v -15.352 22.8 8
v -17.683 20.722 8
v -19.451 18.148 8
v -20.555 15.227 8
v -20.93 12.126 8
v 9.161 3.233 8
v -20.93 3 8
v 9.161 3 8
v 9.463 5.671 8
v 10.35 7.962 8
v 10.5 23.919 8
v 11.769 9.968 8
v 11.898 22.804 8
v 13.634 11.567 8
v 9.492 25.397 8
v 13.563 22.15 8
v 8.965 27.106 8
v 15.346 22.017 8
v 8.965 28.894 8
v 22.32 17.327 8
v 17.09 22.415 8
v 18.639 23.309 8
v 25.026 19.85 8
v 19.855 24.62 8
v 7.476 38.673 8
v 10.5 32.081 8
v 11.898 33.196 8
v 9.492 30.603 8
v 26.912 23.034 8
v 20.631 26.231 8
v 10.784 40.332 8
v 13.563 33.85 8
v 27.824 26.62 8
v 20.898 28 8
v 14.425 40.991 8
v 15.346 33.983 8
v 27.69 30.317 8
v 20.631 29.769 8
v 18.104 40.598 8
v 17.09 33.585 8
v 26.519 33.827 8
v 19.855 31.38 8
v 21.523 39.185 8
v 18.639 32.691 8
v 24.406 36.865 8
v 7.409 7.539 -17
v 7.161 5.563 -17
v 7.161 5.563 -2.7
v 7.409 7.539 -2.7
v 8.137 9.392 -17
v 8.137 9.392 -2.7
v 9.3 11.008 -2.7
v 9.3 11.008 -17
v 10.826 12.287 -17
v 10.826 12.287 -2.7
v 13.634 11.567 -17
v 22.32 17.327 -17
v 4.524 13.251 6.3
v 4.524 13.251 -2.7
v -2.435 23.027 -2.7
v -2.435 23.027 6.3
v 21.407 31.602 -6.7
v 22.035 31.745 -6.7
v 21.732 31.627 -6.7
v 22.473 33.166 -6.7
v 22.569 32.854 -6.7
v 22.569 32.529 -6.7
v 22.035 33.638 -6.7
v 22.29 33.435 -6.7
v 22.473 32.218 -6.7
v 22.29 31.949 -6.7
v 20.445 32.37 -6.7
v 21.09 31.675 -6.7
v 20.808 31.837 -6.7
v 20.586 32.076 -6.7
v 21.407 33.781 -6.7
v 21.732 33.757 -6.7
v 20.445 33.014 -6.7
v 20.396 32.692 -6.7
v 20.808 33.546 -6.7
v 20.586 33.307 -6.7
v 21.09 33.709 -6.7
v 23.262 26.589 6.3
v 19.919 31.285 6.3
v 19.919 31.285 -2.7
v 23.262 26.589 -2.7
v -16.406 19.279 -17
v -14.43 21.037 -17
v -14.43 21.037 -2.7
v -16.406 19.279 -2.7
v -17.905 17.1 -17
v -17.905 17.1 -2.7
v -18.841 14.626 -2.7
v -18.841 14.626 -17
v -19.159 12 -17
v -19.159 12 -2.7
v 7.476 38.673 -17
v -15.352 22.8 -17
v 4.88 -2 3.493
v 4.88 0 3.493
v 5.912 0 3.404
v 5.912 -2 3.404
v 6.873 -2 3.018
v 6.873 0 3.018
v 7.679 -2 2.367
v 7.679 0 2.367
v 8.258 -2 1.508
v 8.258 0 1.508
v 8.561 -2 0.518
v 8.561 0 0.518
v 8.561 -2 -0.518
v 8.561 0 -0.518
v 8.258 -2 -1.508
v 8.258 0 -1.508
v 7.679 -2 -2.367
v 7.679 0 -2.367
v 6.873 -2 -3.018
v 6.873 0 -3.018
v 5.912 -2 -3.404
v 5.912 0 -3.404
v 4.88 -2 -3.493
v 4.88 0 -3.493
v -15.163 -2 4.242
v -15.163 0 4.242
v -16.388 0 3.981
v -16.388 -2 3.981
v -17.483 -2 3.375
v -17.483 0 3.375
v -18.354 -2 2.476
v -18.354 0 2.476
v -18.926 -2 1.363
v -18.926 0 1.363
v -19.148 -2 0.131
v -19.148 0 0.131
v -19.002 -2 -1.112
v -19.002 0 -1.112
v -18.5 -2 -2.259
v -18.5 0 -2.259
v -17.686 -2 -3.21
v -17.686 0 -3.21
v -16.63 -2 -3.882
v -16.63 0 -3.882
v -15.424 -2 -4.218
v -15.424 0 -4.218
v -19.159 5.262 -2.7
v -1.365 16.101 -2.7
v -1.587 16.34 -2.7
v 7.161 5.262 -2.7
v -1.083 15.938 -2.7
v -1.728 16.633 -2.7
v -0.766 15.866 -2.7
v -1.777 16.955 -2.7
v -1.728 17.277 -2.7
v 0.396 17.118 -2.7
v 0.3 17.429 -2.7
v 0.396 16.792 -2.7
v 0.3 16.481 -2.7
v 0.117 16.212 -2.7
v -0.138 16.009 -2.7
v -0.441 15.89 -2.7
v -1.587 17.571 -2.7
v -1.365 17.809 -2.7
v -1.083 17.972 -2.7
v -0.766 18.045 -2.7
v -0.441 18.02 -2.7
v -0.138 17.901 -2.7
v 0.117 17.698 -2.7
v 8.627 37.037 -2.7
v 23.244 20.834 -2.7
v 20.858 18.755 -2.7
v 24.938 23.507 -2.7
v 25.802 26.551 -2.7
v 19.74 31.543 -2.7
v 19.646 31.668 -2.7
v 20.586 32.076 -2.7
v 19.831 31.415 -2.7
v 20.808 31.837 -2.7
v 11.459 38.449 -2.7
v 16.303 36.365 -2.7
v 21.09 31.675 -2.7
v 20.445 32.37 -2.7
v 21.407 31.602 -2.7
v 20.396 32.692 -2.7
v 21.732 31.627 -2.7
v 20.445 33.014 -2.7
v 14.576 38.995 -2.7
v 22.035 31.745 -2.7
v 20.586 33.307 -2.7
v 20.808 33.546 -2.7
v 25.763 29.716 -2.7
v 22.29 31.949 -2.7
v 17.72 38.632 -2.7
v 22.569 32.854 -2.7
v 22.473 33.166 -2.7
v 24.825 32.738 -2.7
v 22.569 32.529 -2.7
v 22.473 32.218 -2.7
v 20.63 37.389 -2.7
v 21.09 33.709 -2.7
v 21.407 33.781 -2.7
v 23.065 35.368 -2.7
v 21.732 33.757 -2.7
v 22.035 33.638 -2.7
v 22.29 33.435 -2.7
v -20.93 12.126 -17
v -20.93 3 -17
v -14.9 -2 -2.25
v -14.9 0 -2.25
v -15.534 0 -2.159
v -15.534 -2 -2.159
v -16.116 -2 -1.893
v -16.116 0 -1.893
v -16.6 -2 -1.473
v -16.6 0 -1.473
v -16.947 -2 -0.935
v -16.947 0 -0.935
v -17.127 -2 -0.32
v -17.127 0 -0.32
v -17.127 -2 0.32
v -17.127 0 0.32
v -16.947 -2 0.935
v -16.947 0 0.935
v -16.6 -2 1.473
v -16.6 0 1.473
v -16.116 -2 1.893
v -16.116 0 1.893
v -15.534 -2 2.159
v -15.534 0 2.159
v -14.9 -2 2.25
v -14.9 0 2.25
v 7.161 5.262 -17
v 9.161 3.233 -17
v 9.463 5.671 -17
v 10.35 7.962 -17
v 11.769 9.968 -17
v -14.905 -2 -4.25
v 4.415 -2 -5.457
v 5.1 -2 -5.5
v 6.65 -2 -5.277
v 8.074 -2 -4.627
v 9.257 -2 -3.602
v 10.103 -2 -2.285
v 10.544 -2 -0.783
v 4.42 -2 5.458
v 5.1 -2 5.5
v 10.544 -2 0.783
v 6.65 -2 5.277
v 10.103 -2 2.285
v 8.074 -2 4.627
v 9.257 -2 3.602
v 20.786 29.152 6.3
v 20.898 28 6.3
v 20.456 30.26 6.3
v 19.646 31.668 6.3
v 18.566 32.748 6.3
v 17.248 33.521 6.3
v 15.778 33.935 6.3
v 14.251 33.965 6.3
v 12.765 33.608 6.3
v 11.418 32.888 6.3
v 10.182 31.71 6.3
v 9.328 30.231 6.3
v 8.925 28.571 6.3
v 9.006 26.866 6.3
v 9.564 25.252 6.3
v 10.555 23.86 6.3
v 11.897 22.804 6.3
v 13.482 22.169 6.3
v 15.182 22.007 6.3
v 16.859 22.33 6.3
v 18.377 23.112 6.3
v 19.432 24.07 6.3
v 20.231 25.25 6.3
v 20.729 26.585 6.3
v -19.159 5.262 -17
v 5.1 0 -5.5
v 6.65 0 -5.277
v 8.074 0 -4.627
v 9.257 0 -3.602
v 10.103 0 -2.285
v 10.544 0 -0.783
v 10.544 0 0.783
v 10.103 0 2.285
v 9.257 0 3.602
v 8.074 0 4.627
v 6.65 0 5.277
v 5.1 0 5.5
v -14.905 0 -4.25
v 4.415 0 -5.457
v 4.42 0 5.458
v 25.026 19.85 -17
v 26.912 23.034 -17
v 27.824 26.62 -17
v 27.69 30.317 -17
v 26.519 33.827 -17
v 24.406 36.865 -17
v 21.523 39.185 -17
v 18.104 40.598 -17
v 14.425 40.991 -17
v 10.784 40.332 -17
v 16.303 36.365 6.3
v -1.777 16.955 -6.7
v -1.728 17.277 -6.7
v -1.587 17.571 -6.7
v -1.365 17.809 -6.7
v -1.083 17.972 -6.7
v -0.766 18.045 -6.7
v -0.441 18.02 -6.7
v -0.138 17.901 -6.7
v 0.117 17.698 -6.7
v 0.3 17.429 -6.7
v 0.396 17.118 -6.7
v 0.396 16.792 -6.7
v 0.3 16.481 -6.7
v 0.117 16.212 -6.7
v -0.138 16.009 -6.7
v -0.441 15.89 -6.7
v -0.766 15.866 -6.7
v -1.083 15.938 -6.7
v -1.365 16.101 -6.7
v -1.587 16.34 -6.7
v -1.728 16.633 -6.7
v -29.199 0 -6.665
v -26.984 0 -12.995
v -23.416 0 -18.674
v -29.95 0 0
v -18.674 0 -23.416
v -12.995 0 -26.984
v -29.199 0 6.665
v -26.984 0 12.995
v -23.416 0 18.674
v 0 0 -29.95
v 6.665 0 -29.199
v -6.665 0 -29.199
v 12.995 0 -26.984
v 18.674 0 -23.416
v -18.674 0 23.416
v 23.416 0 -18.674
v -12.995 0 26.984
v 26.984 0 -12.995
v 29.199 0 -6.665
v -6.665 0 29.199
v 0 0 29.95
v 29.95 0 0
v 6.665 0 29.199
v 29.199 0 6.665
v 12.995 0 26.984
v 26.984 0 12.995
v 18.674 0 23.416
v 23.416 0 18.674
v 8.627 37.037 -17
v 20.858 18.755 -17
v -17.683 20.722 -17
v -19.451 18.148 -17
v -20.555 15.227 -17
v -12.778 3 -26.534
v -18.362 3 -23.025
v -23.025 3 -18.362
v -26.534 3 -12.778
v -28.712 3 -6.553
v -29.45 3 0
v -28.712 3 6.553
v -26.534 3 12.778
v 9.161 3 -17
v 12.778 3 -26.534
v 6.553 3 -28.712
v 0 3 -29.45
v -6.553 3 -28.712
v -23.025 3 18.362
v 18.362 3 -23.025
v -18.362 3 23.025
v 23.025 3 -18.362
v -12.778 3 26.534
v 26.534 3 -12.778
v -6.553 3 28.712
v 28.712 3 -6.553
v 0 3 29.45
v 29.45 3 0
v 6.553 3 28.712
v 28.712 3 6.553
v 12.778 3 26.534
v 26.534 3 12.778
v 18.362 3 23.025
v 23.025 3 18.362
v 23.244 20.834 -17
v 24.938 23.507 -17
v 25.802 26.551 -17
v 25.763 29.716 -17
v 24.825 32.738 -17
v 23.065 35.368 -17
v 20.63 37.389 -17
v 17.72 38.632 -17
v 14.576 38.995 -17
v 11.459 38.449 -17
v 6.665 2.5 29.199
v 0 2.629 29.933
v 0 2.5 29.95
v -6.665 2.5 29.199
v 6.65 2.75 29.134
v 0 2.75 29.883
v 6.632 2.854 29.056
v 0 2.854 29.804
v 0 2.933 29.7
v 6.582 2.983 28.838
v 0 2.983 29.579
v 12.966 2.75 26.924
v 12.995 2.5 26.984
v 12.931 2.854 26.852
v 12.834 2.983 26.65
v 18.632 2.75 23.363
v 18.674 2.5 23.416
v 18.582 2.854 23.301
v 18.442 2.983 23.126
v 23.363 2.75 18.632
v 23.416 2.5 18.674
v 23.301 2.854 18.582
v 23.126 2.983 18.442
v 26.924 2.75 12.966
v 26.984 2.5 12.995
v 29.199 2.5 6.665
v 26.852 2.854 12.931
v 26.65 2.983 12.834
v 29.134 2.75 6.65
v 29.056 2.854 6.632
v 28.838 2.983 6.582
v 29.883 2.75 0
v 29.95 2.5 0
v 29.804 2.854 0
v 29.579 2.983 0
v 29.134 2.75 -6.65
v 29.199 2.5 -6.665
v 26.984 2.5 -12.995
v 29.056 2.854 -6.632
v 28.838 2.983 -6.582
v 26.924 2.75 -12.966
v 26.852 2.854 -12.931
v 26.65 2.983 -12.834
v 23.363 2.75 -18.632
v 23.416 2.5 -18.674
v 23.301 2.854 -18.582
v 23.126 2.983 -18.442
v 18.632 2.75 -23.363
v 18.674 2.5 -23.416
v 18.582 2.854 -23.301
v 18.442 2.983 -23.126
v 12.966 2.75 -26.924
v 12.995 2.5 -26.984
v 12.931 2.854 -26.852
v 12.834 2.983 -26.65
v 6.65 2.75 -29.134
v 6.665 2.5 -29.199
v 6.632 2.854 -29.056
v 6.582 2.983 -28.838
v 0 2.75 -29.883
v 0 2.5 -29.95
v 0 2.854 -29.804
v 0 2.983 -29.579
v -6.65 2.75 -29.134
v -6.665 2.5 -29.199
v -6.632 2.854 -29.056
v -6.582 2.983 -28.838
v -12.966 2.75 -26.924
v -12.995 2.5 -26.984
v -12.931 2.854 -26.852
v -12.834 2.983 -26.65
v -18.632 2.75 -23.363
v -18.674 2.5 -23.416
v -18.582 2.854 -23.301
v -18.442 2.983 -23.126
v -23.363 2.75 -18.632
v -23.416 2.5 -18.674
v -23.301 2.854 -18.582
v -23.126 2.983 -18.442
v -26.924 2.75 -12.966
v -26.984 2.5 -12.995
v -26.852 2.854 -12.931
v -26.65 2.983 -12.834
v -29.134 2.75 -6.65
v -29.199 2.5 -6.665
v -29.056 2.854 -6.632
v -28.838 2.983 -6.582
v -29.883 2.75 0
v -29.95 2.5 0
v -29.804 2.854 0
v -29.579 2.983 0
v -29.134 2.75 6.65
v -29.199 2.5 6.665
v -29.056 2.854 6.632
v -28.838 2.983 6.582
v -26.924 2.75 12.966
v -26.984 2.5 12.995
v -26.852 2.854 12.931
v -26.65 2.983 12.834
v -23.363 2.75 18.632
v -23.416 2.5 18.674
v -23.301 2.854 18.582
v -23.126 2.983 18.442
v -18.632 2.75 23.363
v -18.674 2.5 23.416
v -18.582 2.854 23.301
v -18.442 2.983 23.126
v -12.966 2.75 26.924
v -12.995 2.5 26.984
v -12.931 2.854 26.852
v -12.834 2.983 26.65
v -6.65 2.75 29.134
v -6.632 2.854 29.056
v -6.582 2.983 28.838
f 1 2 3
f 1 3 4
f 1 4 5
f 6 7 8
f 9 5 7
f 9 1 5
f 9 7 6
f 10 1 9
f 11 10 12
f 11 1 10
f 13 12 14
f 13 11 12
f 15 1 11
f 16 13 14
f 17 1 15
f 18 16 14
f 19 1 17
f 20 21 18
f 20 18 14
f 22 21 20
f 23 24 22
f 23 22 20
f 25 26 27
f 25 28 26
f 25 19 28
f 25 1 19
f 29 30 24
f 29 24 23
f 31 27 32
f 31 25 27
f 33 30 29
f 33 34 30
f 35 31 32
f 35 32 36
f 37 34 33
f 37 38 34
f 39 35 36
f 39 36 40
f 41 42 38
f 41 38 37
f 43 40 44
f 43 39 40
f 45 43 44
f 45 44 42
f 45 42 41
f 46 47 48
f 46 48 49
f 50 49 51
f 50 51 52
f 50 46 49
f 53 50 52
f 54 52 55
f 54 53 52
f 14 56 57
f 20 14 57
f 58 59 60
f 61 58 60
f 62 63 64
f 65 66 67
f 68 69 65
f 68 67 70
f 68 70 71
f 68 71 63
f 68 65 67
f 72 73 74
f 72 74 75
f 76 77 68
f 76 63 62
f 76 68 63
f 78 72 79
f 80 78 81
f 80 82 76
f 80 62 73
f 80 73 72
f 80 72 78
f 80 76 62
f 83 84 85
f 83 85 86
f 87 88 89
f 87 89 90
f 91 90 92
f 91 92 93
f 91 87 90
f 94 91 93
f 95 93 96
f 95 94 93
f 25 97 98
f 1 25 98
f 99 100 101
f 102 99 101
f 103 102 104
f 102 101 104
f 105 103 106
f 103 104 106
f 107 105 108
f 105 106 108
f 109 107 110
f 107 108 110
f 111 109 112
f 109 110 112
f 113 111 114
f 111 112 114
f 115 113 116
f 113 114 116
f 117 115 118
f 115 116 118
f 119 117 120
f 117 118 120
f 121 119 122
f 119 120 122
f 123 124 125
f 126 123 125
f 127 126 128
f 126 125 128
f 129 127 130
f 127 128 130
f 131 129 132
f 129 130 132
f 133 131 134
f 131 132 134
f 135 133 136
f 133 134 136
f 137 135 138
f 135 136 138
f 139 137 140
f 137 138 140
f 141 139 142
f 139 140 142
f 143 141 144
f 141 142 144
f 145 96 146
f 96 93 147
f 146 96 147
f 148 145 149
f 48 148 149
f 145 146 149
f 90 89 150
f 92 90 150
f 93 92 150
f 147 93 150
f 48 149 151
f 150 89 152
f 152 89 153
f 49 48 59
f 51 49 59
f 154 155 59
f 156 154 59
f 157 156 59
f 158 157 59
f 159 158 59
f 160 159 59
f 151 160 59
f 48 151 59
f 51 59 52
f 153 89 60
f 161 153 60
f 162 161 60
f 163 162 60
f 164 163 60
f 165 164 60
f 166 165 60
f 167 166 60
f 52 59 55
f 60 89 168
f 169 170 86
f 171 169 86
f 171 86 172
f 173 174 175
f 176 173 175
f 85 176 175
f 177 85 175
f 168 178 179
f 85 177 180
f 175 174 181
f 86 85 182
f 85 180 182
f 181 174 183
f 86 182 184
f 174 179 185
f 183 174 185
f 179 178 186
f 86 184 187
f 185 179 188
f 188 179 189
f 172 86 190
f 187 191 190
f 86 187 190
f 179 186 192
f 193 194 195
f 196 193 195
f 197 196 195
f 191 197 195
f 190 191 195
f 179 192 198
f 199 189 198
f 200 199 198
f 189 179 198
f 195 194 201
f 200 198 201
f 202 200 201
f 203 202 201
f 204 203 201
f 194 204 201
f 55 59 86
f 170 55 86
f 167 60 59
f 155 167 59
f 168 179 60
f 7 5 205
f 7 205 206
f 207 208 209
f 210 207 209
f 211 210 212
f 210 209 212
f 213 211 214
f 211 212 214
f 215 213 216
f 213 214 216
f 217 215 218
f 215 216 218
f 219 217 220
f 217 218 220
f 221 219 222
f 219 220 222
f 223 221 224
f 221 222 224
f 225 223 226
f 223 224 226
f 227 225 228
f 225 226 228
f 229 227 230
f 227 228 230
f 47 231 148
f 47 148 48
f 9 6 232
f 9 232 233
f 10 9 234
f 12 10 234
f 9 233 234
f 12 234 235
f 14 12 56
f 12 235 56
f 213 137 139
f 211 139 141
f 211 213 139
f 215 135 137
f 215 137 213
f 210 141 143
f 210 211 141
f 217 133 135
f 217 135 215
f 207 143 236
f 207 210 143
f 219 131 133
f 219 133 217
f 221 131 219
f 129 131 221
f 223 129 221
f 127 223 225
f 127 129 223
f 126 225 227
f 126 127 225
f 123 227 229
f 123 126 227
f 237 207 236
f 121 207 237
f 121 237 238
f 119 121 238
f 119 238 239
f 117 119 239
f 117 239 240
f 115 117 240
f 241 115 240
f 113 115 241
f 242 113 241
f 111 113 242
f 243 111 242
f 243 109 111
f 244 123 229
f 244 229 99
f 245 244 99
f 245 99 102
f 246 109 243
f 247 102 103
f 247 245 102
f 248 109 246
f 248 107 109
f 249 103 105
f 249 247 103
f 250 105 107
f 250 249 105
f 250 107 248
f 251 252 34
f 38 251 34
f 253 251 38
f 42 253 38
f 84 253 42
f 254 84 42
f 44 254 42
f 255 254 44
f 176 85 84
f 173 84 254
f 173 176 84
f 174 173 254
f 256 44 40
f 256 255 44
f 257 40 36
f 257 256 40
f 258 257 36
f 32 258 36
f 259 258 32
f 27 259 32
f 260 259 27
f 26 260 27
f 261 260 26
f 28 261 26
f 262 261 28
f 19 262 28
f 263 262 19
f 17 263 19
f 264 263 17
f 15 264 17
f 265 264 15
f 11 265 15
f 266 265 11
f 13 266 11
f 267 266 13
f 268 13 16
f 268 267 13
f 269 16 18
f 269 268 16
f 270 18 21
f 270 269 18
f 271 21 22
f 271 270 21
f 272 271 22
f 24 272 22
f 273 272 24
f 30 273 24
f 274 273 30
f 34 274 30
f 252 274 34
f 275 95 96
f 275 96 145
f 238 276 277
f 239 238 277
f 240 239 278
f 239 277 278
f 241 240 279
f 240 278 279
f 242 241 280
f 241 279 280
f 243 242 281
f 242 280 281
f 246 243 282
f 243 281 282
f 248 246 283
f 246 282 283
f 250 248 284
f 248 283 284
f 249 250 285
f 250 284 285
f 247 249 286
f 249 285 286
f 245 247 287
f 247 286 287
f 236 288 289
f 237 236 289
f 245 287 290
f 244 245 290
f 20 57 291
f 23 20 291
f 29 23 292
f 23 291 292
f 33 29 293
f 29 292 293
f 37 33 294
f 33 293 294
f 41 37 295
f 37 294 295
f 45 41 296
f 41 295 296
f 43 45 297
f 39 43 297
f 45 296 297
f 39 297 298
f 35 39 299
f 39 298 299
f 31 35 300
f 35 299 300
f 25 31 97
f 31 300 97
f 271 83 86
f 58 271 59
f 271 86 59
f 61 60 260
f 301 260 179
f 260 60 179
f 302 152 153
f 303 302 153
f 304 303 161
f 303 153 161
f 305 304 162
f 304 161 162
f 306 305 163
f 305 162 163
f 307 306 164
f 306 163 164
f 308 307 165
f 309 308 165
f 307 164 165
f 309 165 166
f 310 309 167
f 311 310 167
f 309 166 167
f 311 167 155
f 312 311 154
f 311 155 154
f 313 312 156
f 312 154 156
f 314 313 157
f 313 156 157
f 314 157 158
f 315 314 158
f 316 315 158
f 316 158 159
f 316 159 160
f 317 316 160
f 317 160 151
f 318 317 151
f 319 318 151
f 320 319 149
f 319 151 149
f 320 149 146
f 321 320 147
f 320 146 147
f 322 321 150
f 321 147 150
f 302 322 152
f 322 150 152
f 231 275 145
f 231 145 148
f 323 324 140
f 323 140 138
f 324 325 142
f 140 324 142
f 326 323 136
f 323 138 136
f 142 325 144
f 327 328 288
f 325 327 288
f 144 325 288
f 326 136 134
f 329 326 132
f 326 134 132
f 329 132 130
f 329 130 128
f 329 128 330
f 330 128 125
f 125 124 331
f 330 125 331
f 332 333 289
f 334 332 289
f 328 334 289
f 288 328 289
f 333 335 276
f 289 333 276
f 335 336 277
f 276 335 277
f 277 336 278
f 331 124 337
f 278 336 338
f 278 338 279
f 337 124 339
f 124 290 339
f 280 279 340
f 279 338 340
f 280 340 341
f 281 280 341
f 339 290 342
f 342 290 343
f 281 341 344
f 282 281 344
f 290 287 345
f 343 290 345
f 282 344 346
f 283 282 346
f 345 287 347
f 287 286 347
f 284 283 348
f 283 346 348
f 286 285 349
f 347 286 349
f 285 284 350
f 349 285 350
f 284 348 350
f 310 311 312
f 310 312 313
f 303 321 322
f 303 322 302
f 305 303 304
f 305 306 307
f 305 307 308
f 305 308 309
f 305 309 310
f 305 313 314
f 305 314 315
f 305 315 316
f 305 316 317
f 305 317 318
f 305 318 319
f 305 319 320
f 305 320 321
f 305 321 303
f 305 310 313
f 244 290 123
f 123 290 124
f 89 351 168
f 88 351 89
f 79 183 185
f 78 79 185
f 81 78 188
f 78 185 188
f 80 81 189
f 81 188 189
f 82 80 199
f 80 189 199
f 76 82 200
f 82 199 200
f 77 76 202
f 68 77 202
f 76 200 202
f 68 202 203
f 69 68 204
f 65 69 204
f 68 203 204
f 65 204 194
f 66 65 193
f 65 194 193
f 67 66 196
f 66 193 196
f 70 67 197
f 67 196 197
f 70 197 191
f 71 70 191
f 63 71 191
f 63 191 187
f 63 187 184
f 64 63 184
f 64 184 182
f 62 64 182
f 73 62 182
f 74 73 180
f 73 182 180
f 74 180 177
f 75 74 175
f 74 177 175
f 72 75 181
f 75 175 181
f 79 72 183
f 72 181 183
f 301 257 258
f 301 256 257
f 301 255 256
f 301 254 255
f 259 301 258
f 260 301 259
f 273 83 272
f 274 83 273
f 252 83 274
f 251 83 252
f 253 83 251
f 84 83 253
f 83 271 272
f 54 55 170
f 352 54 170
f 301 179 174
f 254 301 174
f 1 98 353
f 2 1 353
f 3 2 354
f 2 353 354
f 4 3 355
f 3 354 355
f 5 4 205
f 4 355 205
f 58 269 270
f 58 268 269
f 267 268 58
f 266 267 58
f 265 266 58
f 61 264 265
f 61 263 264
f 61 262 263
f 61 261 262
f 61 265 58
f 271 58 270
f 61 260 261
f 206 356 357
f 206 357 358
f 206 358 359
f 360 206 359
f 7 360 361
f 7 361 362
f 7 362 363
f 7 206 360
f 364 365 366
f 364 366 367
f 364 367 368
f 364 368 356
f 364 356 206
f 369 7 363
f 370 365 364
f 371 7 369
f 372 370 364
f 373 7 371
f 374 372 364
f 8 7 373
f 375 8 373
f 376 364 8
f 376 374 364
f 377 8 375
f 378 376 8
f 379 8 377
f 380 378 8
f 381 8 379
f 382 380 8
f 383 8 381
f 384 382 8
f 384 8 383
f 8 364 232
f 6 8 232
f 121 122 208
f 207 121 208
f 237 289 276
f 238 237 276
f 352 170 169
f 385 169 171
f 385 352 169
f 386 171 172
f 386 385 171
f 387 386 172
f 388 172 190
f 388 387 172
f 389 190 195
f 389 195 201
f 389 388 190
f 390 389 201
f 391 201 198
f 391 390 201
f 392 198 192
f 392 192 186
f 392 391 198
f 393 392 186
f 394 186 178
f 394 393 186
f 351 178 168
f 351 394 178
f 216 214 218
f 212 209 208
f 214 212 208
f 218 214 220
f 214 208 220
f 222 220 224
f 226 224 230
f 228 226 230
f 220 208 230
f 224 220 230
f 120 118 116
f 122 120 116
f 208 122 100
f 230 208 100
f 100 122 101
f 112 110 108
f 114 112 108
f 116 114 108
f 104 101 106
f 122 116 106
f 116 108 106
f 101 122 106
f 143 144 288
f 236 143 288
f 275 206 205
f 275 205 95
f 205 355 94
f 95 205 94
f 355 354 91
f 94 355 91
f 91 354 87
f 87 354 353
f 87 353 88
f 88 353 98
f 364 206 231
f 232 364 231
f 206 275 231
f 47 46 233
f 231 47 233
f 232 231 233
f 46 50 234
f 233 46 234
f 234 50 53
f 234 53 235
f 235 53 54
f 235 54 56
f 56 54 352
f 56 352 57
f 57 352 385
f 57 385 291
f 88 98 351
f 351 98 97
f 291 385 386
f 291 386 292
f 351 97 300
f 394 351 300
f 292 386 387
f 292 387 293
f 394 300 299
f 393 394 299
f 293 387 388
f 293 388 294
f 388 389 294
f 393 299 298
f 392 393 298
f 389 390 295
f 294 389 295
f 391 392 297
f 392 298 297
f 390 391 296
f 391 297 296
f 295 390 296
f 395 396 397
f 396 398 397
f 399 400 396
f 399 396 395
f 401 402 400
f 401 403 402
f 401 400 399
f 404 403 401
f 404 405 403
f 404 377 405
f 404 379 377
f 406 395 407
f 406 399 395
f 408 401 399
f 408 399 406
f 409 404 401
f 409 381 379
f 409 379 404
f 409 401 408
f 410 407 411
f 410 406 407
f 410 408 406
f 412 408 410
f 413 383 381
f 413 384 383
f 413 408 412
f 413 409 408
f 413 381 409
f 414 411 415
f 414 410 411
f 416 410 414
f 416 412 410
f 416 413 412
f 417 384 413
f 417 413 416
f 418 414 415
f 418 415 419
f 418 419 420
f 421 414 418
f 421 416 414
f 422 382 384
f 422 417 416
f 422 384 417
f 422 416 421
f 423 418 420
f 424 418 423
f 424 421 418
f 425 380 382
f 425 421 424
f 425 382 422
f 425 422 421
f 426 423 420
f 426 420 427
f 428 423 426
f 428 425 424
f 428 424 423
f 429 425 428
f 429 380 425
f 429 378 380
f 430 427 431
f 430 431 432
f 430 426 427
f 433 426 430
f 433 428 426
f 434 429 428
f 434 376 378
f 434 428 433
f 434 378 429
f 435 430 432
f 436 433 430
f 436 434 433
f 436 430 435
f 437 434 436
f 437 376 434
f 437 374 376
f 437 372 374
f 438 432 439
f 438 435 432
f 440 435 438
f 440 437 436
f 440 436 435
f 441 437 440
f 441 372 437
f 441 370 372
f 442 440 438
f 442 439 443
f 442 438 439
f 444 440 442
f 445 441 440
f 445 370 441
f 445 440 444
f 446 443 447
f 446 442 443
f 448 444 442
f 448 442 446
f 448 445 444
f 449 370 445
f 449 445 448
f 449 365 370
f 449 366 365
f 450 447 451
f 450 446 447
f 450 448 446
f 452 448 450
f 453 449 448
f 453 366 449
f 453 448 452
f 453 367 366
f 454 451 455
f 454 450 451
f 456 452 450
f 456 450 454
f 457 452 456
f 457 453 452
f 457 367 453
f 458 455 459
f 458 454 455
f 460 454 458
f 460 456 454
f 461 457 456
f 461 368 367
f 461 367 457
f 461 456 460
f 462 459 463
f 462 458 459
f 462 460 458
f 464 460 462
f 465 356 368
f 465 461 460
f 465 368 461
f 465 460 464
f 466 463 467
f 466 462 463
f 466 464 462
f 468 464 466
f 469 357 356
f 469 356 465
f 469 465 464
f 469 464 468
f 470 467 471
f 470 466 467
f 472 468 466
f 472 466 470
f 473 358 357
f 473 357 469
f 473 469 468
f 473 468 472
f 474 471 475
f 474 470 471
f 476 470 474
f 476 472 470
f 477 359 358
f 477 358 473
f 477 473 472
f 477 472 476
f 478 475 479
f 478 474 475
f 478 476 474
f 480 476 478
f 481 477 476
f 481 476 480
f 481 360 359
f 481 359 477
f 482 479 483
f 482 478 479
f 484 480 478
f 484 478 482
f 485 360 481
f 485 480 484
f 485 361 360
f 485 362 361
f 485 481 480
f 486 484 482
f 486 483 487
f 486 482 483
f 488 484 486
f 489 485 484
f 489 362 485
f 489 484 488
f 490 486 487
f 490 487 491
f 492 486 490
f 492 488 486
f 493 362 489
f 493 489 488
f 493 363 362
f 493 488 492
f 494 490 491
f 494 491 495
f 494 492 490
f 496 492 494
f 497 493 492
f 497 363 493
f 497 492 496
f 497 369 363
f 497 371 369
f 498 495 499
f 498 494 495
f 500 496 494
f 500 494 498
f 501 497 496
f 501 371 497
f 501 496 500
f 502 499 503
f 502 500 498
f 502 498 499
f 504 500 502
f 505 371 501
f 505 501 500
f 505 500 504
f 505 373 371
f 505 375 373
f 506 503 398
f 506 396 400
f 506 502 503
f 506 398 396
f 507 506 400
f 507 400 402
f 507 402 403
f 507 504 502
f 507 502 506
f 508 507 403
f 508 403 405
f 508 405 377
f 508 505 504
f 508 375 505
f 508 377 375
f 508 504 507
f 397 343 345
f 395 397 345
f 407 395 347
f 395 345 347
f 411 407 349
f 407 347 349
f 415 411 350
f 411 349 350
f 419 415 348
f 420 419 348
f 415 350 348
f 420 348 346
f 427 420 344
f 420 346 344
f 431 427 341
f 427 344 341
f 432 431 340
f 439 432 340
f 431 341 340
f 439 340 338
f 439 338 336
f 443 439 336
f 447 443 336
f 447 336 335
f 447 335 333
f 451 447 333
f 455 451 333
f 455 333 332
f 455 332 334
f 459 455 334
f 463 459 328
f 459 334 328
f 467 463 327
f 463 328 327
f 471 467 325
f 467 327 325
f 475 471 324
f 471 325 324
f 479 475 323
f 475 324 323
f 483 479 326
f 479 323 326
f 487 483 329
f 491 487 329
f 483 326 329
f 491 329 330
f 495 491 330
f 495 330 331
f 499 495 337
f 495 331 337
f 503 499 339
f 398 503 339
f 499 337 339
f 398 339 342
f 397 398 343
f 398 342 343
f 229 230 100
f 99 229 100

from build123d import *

# Parameters (mm, degrees)
SKETCH1_R                = 29.95
BOSS_EXTRUDE1_DEPTH      = 3
FILLET1_R                = 0.5
BOSS_EXTRUDE2_DEPTH      = 8
BOSS_EXTRUDE2_DEPTH_BACK = 17
SKETCH3_R                = 6
CUT_EXTRUDE2_DEPTH       = 14.3
CUT_EXTRUDE4_START       = -14.3
CUT_EXTRUDE4_DEPTH       = 9
SKETCH7_R                = 1.0925
BOSS_EXTRUDE3_DEPTH      = 4
BOSS_EXTRUDE4_DEPTH      = 2


with BuildPart() as part:
    # Sketch1 → Boss-Extrude1 (new body)
    with BuildSketch(Plane(origin=(0, 0, 0), x_dir=(1, 0, 0), z_dir=(0, 1, 0))):
        with Locations(Location((0, 0, 0), (0, 0, 270))):
            Circle(SKETCH1_R)
    extrude(amount=BOSS_EXTRUDE1_DEPTH)

    # Fillet1
    fillet1_edges = [part.edges().sort_by_distance(p)[0] for p in [
        (0, 3, -29.95),
    ]]
    fillet(fillet1_edges, radius=FILLET1_R)

    # Sketch3 → Boss-Extrude2 (add, two sides: drawn at the far end of the back side and taken through both)
    with BuildSketch(Plane.XY.offset(-BOSS_EXTRUDE2_DEPTH_BACK)):
        with BuildLine():
            ThreePointArc((22.319611022, 17.326801635), (25.571028156, 35.421781232), (7.476048559, 38.673198365))
            Line((7.476048559, 38.673198365), (-15.351755113, 22.799515608))
            ThreePointArc((-15.351755113, 22.799515608), (-19.451327013, 18.1478139), (-20.929973881, 12.126317243))
            Line((-20.929973881, 12.126317243), (-20.929973881, 3))
            Line((-20.929973881, 3), (9.161240081, 3))
            Line((9.161240081, 3), (9.161240081, 3.233006236))
            ThreePointArc((9.161240081, 3.233006236), (10.350199335, 7.962230378), (13.634352277, 11.566883557))
            Line((13.634352277, 11.566883557), (22.319611022, 17.326801635))
        make_face()
        with Locations((14.897829791, 28)):
            Circle(SKETCH3_R, mode=Mode.SUBTRACT)
    extrude(amount=BOSS_EXTRUDE2_DEPTH + BOSS_EXTRUDE2_DEPTH_BACK)

    # Sketch5 → Cut-Extrude2 (cut)
    with BuildSketch(Plane(origin=(0, 0, -17), x_dir=(-1, 0, 0), z_dir=(0, 0, -1))):
        with BuildLine():
            Line((-8.626514029, 37.037178687), (14.430028566, 21.037178687))
            ThreePointArc((14.430028566, 21.037178687), (17.905108892, 17.099780712), (19.158712805, 12))
            Line((19.158712805, 12), (19.158712805, 5.262193484))
            Line((19.158712805, 5.262193484), (-7.161240081, 5.262193484))
            Line((-7.161240081, 5.262193484), (-7.161240081, 5.56341477))
            ThreePointArc((-7.161240081, 5.56341477), (-8.137033641, 9.392321128), (-10.826371055, 12.287171944))
            Line((-10.826371055, 12.287171944), (-20.858274701, 18.754833886))
            ThreePointArc((-20.858274701, 18.754833886), (-24.040323598, 34.116764421), (-8.626514029, 37.037178687))
        make_face()
    extrude(amount=-CUT_EXTRUDE2_DEPTH, mode=Mode.SUBTRACT)

    # Sketch4 → Cut-Extrude4 (cut)
    with BuildSketch(Plane(origin=(0, 0, -17), x_dir=(-1, 0, 0), z_dir=(0, 0, -1)).offset(CUT_EXTRUDE4_START)):
        Polygon((-23.261597646, 26.588590728), (-4.523766462, 13.250911675), (2.435022609, 23.027171423), (-16.302808575, 36.364850476), align=None)
    extrude(amount=-CUT_EXTRUDE4_DEPTH, mode=Mode.SUBTRACT)

    # Sketch7 → Boss-Extrude3 (add)
    with BuildSketch(Plane(origin=(0, 0, -2.7), x_dir=(-1, 0, 0), z_dir=(0, 0, -1))):
        with Locations((-21.488975125, 32.691609194)):
            Circle(SKETCH7_R)
        with Locations((0.684110702, 16.95524562)):
            Circle(SKETCH7_R)
    extrude(amount=BOSS_EXTRUDE3_DEPTH)

    # Sketch8 → Boss-Extrude4 (add)
    with BuildSketch(Plane.XZ):
        with BuildLine():
            Line((4.419624532, 5.457754962), (-15.163378573, 4.241831176))
            ThreePointArc((-15.163378573, 4.241831176), (-19.147983311, 0.130911389), (-15.424074318, -4.217564002))
            Line((-15.424074318, -4.217564002), (-14.905016784, -4.249997039))
            Line((-14.905016784, -4.249997039), (4.41534389, -5.457219623))
            Line((4.41534389, -5.457219623), (5.1, -5.5))
            ThreePointArc((5.1, -5.5), (10.6, 0), (5.1, 5.5))
            Line((5.1, 5.5), (4.419624532, 5.457754962))
        make_face()
        with BuildLine():
            Line((-14.9, 2.25), (4.880474733, 3.493108738))
            ThreePointArc((4.880474733, 3.493108738), (8.6, 0), (4.880474733, -3.493108738))
            Line((4.880474733, -3.493108738), (-14.9, -2.25))
            ThreePointArc((-14.9, -2.25), (-17.15, 0), (-14.9, 2.25))
        make_face(mode=Mode.SUBTRACT)
    extrude(amount=BOSS_EXTRUDE4_DEPTH)


solid = part.part
